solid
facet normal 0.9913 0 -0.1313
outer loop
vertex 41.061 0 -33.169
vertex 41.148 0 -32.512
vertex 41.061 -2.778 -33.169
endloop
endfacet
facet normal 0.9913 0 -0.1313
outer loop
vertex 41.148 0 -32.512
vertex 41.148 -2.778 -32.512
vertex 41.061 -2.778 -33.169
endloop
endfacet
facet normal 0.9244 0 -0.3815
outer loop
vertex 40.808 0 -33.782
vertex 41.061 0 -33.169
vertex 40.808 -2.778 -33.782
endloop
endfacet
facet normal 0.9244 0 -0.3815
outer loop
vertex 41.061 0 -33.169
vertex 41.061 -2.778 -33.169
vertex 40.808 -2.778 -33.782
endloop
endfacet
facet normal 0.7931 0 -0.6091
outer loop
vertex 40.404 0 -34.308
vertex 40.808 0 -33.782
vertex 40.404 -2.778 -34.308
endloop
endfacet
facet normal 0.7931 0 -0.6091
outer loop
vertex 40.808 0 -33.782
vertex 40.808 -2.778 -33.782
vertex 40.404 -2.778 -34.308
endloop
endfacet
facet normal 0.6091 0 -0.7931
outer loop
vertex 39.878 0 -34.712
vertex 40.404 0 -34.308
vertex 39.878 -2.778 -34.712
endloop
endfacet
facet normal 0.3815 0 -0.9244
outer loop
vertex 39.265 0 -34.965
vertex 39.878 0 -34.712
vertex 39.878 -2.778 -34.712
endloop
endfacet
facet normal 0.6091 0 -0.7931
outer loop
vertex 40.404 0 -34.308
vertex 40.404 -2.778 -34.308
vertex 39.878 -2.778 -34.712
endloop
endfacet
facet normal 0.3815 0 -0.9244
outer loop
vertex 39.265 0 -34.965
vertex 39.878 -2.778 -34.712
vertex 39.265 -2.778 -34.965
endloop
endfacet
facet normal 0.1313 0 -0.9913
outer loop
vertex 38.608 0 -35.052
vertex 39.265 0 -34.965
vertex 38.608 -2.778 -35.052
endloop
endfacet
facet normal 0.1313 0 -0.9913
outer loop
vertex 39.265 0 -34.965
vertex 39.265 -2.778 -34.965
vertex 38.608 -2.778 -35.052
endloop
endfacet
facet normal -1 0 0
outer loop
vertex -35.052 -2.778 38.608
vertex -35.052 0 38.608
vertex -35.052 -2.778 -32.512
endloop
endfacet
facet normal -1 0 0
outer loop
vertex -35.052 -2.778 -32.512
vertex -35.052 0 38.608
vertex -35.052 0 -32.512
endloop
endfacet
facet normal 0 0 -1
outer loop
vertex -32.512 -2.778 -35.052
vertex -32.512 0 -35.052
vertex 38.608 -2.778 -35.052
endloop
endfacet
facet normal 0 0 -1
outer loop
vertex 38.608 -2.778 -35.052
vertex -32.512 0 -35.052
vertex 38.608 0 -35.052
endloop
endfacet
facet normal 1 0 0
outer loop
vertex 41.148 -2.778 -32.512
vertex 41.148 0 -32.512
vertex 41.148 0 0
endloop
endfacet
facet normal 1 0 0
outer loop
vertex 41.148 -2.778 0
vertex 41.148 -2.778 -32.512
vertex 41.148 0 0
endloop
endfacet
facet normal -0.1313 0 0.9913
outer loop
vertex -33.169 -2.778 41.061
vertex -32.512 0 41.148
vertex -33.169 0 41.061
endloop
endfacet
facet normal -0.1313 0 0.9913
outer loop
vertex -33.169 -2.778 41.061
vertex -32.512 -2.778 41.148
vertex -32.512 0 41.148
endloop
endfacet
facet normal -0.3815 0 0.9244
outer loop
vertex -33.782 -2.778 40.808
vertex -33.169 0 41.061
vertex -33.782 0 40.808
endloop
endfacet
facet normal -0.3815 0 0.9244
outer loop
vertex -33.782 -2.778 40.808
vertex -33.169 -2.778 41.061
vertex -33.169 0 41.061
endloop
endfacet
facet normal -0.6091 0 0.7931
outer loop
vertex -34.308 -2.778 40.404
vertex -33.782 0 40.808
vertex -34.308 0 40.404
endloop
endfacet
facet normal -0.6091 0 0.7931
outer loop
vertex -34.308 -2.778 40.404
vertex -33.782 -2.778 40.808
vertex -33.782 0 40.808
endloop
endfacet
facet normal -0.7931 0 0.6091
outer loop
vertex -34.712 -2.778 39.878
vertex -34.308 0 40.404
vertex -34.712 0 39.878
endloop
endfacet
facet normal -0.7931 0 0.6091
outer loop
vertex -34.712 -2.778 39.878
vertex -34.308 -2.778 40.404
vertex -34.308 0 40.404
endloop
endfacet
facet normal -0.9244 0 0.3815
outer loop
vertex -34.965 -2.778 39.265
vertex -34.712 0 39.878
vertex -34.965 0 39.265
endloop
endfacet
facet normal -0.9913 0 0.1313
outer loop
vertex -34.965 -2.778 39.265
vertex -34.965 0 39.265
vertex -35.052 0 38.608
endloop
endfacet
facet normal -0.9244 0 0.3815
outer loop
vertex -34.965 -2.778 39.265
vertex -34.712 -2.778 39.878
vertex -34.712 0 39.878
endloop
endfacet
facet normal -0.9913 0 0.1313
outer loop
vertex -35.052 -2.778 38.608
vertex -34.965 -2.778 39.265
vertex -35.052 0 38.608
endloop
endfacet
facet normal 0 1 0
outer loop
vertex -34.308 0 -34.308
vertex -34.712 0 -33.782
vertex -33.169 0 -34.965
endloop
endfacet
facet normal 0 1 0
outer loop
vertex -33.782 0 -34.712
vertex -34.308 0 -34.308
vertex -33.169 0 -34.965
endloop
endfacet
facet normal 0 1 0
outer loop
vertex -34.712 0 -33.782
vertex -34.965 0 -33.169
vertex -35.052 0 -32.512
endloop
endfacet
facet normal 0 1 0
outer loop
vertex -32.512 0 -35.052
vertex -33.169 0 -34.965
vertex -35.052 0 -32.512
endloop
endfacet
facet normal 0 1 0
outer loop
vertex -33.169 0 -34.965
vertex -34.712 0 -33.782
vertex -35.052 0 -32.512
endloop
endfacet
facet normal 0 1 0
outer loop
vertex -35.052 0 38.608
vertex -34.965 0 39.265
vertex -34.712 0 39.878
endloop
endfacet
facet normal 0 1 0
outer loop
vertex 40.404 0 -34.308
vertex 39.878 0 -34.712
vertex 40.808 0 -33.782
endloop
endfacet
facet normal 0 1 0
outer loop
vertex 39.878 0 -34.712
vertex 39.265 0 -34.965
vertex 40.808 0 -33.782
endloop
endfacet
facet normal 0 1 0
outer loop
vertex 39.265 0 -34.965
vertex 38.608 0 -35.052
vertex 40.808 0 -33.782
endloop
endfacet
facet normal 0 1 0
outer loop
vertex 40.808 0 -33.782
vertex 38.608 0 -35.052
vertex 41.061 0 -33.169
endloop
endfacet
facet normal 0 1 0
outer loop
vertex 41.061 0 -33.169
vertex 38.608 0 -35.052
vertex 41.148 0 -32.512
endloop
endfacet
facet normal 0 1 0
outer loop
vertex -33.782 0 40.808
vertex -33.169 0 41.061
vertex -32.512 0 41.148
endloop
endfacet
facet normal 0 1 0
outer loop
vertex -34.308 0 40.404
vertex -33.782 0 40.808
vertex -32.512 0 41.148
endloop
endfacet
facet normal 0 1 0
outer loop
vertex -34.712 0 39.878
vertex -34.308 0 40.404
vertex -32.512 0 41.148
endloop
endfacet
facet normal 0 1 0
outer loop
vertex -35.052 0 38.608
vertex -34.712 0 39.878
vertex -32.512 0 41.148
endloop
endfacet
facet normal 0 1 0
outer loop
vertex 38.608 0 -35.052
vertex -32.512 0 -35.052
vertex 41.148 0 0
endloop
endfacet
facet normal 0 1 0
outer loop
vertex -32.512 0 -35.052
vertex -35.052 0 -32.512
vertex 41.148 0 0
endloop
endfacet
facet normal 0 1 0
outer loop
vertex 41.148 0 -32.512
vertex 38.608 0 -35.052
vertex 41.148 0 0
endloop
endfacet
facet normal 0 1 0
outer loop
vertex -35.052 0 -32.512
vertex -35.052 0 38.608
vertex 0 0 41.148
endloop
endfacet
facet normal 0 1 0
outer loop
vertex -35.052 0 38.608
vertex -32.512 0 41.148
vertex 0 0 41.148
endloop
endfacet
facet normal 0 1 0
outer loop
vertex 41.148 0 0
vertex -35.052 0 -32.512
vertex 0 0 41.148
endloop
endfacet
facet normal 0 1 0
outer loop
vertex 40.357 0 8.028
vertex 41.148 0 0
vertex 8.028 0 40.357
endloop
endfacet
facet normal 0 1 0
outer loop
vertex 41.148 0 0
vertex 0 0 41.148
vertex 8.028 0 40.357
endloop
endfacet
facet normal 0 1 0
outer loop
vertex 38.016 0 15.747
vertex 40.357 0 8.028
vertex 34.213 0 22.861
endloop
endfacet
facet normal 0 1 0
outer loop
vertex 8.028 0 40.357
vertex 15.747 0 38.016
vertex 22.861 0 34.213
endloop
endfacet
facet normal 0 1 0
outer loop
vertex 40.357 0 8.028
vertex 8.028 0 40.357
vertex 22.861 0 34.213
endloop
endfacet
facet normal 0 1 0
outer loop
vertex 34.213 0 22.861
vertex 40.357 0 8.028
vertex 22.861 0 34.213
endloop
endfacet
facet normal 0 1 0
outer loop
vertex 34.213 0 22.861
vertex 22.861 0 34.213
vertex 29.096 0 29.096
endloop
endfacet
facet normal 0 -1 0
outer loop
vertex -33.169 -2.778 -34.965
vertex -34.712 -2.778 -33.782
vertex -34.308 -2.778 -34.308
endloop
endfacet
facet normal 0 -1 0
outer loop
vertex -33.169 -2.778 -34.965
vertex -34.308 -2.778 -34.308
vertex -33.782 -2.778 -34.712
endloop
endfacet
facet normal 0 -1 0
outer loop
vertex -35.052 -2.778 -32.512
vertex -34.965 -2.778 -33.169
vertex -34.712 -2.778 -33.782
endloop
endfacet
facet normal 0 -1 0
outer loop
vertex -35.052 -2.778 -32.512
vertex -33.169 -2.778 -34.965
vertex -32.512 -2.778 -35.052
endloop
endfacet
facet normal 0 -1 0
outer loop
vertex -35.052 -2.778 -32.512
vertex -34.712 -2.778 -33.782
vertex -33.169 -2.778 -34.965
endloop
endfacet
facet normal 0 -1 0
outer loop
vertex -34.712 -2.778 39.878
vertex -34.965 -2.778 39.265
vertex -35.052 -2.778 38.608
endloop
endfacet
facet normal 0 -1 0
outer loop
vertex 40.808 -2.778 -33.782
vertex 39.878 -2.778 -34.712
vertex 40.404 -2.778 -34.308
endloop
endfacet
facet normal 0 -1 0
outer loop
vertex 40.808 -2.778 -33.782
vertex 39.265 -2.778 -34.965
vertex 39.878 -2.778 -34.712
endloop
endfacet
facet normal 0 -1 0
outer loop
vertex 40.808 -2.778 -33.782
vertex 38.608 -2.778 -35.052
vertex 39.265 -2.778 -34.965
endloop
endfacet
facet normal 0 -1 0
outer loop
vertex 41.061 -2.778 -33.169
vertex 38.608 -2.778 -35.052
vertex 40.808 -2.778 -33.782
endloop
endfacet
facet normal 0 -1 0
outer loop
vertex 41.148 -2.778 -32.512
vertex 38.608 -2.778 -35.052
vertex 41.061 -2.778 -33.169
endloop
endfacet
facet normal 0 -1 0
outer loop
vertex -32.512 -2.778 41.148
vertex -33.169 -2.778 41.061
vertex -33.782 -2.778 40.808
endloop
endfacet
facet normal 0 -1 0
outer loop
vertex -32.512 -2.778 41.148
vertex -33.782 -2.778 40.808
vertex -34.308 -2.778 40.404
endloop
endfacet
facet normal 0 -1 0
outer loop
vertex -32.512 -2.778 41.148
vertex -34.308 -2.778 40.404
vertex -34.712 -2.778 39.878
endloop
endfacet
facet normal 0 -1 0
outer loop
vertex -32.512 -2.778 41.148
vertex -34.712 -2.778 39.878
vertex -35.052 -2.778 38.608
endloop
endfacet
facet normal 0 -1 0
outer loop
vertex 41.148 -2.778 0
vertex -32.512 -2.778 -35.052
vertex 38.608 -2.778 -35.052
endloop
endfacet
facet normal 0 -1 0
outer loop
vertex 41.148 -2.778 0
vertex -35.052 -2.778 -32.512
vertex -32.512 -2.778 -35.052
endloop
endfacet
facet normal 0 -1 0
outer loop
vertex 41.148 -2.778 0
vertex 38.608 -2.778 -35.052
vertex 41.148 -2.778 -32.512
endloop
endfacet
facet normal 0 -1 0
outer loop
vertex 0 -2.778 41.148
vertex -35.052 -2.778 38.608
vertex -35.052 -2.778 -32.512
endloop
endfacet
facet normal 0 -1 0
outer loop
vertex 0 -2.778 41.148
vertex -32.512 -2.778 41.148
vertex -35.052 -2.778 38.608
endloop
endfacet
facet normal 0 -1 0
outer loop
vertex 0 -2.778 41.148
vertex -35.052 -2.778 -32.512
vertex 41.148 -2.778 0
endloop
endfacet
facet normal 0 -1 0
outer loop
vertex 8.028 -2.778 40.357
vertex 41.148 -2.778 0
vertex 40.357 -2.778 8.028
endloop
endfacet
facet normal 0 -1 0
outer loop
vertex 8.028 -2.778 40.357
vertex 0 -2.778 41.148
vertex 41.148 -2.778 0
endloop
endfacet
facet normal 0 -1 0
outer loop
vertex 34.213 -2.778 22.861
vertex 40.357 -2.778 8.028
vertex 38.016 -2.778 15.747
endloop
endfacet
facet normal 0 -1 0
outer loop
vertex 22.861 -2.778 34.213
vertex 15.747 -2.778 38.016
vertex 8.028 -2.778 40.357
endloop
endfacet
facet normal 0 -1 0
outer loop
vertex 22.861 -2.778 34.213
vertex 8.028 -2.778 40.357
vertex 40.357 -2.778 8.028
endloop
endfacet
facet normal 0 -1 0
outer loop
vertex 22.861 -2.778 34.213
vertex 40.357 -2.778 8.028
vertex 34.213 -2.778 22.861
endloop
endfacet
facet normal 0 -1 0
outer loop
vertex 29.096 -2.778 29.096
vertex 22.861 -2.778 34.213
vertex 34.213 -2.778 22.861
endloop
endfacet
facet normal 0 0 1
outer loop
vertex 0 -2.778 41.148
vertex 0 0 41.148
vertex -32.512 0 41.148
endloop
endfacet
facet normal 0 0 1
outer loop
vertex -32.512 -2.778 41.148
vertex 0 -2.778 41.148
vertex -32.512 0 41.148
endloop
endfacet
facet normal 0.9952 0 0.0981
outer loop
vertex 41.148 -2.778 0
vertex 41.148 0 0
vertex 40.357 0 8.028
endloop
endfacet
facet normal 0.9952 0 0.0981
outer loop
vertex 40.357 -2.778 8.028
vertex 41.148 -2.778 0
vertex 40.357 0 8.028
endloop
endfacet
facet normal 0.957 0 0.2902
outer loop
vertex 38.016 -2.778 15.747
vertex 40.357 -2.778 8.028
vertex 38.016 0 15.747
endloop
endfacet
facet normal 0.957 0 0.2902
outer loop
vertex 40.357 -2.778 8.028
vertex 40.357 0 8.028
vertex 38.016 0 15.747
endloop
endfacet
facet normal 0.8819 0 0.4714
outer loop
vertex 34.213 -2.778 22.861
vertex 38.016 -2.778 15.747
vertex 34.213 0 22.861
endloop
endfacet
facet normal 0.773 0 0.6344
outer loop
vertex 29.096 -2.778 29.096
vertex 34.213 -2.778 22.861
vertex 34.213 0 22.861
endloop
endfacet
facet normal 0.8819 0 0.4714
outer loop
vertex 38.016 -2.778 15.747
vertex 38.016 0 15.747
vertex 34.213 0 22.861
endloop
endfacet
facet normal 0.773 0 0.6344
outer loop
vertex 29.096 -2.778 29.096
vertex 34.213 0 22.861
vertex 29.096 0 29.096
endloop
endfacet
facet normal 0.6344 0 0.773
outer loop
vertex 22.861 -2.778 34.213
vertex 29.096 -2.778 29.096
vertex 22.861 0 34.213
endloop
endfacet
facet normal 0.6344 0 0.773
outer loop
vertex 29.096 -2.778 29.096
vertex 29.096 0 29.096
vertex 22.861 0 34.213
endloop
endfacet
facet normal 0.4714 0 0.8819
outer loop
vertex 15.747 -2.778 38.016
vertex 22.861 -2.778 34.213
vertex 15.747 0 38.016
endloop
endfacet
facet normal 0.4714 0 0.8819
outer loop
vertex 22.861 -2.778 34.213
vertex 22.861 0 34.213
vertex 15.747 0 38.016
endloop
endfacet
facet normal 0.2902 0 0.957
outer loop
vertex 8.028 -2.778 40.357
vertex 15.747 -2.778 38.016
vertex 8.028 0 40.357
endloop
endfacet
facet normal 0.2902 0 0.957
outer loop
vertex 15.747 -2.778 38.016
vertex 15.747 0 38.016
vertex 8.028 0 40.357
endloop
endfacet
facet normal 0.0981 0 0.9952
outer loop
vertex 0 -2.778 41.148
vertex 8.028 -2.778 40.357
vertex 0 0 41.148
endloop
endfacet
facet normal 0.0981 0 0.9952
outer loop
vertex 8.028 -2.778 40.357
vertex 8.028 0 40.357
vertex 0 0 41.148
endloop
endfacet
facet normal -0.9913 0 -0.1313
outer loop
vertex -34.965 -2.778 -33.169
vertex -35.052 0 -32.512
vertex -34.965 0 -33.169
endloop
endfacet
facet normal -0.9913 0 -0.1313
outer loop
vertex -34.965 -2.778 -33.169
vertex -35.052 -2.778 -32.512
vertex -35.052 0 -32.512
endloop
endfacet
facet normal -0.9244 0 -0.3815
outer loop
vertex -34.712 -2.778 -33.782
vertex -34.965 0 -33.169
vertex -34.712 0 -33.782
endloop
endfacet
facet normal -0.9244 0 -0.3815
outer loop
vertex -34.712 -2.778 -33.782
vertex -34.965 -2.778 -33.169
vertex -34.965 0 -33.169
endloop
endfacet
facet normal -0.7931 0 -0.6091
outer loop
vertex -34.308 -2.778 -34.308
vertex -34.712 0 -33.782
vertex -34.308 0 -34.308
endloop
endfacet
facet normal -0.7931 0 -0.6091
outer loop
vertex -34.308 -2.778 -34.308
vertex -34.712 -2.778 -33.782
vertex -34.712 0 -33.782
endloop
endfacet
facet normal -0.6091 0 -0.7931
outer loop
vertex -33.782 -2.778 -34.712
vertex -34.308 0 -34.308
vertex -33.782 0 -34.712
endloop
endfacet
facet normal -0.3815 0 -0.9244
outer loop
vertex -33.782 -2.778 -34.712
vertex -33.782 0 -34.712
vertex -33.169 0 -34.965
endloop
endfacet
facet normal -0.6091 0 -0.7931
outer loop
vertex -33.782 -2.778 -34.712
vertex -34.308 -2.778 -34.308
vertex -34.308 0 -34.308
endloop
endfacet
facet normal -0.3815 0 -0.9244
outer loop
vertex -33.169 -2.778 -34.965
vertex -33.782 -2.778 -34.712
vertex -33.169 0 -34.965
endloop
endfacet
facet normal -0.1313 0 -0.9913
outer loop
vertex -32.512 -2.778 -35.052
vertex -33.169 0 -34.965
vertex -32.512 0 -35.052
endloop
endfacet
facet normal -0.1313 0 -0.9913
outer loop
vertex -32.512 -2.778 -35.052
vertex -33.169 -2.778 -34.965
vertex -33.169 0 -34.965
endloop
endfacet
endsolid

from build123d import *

# Parameters (mm, degrees)
F1_DEPTH = 2.778125
F2_R     = 2.54


with BuildPart() as f1:
    # F0 (on Front) → F1 (new body)
    with BuildSketch(Plane.XZ):
        with BuildLine():
            Line((41.148, -35.052), (41.148, 0))
            ThreePointArc((41.148, 0), (29.09603, 29.09603), (0, 41.148))
            Line((0, 41.148), (-35.052, 41.148))
            Line((-35.052, 41.148), (-35.052, -35.052))
            Line((-35.052, -35.052), (41.148, -35.052))
        make_face()
    extrude(amount=F1_DEPTH)

    # F2
    f2_edges = [f1.edges().sort_by_distance(p)[0] for p in [
        (-35.052, -1.389063, -35.052),
        (-35.052, -1.389063, 41.148),
        (41.148, -1.389063, -35.052),
    ]]
    fillet(f2_edges, radius=F2_R)


solid = f1.part
